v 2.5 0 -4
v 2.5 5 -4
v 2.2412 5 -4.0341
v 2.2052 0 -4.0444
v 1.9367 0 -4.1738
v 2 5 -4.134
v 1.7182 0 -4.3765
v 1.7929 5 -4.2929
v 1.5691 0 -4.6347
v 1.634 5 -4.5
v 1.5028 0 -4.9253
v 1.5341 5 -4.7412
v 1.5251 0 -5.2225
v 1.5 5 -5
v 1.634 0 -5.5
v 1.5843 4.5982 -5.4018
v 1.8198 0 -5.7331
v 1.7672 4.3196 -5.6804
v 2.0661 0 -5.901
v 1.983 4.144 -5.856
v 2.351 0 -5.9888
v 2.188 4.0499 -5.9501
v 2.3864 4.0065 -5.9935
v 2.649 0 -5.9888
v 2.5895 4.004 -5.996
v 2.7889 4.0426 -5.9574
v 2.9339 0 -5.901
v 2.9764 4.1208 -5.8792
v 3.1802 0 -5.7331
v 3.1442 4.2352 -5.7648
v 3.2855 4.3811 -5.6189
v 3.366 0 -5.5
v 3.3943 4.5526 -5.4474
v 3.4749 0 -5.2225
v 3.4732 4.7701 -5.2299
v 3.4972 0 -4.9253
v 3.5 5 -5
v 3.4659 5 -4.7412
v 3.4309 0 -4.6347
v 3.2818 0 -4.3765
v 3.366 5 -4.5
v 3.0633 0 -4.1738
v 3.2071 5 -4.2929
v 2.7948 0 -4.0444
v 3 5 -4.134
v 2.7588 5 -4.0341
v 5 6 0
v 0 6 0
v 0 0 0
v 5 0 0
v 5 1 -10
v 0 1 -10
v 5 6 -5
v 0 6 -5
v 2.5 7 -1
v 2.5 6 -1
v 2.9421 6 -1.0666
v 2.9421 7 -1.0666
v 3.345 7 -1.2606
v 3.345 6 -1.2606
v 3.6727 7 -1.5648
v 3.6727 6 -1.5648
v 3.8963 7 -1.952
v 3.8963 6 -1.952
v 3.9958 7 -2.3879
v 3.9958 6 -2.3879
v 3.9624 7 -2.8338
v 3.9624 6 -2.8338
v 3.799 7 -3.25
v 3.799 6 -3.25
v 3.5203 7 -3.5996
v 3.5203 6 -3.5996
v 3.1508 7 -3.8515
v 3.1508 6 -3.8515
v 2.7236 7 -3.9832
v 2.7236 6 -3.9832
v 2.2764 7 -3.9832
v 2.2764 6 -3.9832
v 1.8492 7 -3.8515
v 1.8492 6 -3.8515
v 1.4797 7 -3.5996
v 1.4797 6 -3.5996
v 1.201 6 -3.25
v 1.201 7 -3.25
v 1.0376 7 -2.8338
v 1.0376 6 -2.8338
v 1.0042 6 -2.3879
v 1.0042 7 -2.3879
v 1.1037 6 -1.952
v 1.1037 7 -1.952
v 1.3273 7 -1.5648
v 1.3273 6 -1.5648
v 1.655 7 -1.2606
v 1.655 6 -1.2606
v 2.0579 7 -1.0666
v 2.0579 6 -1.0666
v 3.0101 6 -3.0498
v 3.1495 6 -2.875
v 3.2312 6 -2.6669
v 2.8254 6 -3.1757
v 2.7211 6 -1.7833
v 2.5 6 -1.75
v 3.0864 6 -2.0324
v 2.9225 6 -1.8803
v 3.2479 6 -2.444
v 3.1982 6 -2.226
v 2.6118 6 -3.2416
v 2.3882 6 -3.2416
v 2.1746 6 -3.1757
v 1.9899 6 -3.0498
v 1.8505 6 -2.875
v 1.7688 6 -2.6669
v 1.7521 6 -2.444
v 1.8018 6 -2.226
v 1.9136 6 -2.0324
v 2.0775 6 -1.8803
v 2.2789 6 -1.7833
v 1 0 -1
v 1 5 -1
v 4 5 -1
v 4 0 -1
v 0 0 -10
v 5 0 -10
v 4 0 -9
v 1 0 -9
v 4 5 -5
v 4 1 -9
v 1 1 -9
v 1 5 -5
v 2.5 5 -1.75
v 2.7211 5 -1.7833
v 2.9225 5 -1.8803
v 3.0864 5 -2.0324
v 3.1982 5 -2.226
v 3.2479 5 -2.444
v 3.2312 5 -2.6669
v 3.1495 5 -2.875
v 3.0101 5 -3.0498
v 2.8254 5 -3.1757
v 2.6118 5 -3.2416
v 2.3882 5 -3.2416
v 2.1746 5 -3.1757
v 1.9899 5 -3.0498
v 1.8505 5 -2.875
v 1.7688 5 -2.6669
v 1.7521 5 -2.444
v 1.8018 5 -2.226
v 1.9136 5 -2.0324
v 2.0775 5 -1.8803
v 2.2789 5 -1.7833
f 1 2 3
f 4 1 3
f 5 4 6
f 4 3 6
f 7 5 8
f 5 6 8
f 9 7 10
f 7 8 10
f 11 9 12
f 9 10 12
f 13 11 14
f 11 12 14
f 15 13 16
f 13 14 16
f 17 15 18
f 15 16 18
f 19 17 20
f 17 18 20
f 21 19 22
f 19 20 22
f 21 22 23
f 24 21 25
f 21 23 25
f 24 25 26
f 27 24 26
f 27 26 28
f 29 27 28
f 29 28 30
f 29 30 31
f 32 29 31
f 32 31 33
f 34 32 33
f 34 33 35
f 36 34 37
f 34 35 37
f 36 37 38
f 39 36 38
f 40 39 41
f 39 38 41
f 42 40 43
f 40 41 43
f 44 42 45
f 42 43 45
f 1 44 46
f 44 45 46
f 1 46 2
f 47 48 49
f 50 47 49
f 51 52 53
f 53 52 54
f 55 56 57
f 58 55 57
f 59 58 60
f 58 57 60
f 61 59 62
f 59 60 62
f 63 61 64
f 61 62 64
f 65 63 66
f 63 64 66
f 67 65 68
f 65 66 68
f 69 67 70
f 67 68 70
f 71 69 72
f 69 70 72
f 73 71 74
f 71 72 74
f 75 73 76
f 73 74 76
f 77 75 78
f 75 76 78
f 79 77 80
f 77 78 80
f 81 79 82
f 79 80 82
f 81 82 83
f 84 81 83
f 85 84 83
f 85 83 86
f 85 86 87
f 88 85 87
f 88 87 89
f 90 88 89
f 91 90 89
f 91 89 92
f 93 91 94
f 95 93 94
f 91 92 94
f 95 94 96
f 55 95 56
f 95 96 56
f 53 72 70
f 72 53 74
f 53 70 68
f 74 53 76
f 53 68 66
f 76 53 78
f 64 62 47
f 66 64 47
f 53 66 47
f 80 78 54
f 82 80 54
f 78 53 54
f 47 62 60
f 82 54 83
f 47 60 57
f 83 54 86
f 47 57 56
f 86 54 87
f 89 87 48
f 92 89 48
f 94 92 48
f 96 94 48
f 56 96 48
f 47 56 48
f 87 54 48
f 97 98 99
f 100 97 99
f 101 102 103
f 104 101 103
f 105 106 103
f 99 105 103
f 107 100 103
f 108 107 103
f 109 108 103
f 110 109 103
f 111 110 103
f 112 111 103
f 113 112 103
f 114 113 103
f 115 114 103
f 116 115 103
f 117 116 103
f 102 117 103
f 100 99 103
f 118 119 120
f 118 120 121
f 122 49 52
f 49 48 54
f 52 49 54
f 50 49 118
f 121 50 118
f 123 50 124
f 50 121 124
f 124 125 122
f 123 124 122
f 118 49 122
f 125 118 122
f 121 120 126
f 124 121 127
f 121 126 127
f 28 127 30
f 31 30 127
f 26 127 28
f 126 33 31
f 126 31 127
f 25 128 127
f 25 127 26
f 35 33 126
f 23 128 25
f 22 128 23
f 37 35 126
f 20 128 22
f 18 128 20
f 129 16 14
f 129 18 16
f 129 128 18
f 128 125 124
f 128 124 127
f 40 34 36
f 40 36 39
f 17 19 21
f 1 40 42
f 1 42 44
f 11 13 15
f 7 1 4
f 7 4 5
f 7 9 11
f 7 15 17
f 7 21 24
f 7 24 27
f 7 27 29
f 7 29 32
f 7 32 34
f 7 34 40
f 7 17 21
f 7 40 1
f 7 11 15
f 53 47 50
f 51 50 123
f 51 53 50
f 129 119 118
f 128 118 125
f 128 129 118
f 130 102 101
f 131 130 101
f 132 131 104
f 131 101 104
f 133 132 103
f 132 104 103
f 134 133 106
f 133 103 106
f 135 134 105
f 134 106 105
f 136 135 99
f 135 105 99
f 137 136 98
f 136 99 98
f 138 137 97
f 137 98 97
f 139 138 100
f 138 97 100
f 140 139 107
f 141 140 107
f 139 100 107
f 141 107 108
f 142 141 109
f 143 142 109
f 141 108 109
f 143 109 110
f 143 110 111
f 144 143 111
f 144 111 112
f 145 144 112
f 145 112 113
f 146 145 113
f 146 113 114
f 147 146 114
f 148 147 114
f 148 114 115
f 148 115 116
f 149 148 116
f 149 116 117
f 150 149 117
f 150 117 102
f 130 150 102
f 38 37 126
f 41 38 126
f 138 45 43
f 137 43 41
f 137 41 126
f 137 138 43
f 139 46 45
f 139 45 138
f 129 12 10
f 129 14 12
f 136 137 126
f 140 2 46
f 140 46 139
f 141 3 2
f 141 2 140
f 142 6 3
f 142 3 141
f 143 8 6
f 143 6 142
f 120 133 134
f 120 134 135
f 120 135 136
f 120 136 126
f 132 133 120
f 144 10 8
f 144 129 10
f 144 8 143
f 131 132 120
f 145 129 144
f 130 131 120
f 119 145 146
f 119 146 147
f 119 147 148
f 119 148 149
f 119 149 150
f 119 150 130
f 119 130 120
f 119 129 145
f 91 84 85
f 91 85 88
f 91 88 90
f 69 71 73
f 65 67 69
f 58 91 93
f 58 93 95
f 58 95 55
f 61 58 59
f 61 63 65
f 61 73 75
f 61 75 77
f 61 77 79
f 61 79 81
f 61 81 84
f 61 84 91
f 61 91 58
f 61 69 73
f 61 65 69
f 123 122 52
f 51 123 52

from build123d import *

# Parameters (mm, degrees)
BOSS_EXTRUDE2_DEPTH = 5
CUT_EXTRUDE1_DEPTH  = 4
BOSS_EXTRUDE3_DEPTH = 1
CUT_EXTRUDE2_REACH  = 14.689
SKETCH4_R           = 0.75
SKETCH4_4_R         = 1.5
SKETCH4_4_R_2       = 0.75
BOSS_EXTRUDE6_DEPTH = 1
SKETCH6_R           = 1
BOSS_EXTRUDE7_DEPTH = 5


with BuildPart() as part:
    # Sketch3 → Boss-Extrude2 (new body)
    with BuildSketch(Plane(origin=(0, 0, 0), x_dir=(0, 0, -1), z_dir=(1, 0, 0))):
        Polygon((5, 5), (4, 6), (1, 6), (0, 6), (0, 0), (1, 0), (1, 5), align=None)
        Polygon((9, 1), (5, 5), (1, 5), (1, 0), (9, 0), align=None)
        Polygon((10, 1), (5, 6), (4, 6), (5, 5), (9, 1), (9, 0), (10, 0), align=None)
    extrude(amount=BOSS_EXTRUDE2_DEPTH)

    # Sketch3<5> → Cut-Extrude1 (cut)
    with BuildSketch(Plane(origin=(0, 0, 0), x_dir=(0, 0, -1), z_dir=(1, 0, 0))):
        Polygon((9, 1), (5, 5), (1, 5), (1, 0), (9, 0), align=None)
    extrude(amount=CUT_EXTRUDE1_DEPTH, mode=Mode.SUBTRACT)

    # Sketch3<6> → Boss-Extrude3 (add)
    with BuildSketch(Plane(origin=(0, 0, 0), x_dir=(0, 0, -1), z_dir=(1, 0, 0))):
        Polygon((9, 1), (5, 5), (1, 5), (1, 0), (9, 0), align=None)
    extrude(amount=BOSS_EXTRUDE3_DEPTH)

    # Sketch4 → Cut-Extrude2 (cut, up to next)
    with BuildSketch(Plane(origin=(0, 6, 0), x_dir=(1, 0, 0), z_dir=(0, 1, 0)), mode=Mode.PRIVATE) as cut_extrude2_sk1:
        with Locations(Location((2.5, 2.5, 0), (0, 0, 270))):
            Circle(SKETCH4_R)
    cut_extrude2_tool1 = extrude(cut_extrude2_sk1.sketch, amount=-CUT_EXTRUDE2_REACH, mode=Mode.PRIVATE) & part.part
    add(cut_extrude2_tool1.solids().sort_by_distance((2.5, 6, -2.5))[0], mode=Mode.SUBTRACT)

    # Sketch4<4> → Boss-Extrude6 (add)
    with BuildSketch(Plane(origin=(0, 6, 0), x_dir=(1, 0, 0), z_dir=(0, 1, 0))):
        with Locations(Location((2.5, 2.5, 0), (0, 0, 270))):
            Circle(SKETCH4_4_R)
        with Locations(Location((2.5, 2.5, 0), (0, 0, 270))):
            Circle(SKETCH4_4_R_2, mode=Mode.SUBTRACT)
        with Locations(Location((2.5, 2.5, 0), (0, 0, 270))):
            Circle(SKETCH4_4_R_2)
    extrude(amount=BOSS_EXTRUDE6_DEPTH)

    # Sketch6 → Boss-Extrude7 (add)
    with BuildSketch(Plane(origin=(0, 5, 0), x_dir=(-1, 0, 0), z_dir=(0, -1, 0))):
        with Locations(Location((-2.5, 5, 0), (0, 0, 270))):
            Circle(SKETCH6_R)
    extrude(amount=BOSS_EXTRUDE7_DEPTH)


solid = part.part
